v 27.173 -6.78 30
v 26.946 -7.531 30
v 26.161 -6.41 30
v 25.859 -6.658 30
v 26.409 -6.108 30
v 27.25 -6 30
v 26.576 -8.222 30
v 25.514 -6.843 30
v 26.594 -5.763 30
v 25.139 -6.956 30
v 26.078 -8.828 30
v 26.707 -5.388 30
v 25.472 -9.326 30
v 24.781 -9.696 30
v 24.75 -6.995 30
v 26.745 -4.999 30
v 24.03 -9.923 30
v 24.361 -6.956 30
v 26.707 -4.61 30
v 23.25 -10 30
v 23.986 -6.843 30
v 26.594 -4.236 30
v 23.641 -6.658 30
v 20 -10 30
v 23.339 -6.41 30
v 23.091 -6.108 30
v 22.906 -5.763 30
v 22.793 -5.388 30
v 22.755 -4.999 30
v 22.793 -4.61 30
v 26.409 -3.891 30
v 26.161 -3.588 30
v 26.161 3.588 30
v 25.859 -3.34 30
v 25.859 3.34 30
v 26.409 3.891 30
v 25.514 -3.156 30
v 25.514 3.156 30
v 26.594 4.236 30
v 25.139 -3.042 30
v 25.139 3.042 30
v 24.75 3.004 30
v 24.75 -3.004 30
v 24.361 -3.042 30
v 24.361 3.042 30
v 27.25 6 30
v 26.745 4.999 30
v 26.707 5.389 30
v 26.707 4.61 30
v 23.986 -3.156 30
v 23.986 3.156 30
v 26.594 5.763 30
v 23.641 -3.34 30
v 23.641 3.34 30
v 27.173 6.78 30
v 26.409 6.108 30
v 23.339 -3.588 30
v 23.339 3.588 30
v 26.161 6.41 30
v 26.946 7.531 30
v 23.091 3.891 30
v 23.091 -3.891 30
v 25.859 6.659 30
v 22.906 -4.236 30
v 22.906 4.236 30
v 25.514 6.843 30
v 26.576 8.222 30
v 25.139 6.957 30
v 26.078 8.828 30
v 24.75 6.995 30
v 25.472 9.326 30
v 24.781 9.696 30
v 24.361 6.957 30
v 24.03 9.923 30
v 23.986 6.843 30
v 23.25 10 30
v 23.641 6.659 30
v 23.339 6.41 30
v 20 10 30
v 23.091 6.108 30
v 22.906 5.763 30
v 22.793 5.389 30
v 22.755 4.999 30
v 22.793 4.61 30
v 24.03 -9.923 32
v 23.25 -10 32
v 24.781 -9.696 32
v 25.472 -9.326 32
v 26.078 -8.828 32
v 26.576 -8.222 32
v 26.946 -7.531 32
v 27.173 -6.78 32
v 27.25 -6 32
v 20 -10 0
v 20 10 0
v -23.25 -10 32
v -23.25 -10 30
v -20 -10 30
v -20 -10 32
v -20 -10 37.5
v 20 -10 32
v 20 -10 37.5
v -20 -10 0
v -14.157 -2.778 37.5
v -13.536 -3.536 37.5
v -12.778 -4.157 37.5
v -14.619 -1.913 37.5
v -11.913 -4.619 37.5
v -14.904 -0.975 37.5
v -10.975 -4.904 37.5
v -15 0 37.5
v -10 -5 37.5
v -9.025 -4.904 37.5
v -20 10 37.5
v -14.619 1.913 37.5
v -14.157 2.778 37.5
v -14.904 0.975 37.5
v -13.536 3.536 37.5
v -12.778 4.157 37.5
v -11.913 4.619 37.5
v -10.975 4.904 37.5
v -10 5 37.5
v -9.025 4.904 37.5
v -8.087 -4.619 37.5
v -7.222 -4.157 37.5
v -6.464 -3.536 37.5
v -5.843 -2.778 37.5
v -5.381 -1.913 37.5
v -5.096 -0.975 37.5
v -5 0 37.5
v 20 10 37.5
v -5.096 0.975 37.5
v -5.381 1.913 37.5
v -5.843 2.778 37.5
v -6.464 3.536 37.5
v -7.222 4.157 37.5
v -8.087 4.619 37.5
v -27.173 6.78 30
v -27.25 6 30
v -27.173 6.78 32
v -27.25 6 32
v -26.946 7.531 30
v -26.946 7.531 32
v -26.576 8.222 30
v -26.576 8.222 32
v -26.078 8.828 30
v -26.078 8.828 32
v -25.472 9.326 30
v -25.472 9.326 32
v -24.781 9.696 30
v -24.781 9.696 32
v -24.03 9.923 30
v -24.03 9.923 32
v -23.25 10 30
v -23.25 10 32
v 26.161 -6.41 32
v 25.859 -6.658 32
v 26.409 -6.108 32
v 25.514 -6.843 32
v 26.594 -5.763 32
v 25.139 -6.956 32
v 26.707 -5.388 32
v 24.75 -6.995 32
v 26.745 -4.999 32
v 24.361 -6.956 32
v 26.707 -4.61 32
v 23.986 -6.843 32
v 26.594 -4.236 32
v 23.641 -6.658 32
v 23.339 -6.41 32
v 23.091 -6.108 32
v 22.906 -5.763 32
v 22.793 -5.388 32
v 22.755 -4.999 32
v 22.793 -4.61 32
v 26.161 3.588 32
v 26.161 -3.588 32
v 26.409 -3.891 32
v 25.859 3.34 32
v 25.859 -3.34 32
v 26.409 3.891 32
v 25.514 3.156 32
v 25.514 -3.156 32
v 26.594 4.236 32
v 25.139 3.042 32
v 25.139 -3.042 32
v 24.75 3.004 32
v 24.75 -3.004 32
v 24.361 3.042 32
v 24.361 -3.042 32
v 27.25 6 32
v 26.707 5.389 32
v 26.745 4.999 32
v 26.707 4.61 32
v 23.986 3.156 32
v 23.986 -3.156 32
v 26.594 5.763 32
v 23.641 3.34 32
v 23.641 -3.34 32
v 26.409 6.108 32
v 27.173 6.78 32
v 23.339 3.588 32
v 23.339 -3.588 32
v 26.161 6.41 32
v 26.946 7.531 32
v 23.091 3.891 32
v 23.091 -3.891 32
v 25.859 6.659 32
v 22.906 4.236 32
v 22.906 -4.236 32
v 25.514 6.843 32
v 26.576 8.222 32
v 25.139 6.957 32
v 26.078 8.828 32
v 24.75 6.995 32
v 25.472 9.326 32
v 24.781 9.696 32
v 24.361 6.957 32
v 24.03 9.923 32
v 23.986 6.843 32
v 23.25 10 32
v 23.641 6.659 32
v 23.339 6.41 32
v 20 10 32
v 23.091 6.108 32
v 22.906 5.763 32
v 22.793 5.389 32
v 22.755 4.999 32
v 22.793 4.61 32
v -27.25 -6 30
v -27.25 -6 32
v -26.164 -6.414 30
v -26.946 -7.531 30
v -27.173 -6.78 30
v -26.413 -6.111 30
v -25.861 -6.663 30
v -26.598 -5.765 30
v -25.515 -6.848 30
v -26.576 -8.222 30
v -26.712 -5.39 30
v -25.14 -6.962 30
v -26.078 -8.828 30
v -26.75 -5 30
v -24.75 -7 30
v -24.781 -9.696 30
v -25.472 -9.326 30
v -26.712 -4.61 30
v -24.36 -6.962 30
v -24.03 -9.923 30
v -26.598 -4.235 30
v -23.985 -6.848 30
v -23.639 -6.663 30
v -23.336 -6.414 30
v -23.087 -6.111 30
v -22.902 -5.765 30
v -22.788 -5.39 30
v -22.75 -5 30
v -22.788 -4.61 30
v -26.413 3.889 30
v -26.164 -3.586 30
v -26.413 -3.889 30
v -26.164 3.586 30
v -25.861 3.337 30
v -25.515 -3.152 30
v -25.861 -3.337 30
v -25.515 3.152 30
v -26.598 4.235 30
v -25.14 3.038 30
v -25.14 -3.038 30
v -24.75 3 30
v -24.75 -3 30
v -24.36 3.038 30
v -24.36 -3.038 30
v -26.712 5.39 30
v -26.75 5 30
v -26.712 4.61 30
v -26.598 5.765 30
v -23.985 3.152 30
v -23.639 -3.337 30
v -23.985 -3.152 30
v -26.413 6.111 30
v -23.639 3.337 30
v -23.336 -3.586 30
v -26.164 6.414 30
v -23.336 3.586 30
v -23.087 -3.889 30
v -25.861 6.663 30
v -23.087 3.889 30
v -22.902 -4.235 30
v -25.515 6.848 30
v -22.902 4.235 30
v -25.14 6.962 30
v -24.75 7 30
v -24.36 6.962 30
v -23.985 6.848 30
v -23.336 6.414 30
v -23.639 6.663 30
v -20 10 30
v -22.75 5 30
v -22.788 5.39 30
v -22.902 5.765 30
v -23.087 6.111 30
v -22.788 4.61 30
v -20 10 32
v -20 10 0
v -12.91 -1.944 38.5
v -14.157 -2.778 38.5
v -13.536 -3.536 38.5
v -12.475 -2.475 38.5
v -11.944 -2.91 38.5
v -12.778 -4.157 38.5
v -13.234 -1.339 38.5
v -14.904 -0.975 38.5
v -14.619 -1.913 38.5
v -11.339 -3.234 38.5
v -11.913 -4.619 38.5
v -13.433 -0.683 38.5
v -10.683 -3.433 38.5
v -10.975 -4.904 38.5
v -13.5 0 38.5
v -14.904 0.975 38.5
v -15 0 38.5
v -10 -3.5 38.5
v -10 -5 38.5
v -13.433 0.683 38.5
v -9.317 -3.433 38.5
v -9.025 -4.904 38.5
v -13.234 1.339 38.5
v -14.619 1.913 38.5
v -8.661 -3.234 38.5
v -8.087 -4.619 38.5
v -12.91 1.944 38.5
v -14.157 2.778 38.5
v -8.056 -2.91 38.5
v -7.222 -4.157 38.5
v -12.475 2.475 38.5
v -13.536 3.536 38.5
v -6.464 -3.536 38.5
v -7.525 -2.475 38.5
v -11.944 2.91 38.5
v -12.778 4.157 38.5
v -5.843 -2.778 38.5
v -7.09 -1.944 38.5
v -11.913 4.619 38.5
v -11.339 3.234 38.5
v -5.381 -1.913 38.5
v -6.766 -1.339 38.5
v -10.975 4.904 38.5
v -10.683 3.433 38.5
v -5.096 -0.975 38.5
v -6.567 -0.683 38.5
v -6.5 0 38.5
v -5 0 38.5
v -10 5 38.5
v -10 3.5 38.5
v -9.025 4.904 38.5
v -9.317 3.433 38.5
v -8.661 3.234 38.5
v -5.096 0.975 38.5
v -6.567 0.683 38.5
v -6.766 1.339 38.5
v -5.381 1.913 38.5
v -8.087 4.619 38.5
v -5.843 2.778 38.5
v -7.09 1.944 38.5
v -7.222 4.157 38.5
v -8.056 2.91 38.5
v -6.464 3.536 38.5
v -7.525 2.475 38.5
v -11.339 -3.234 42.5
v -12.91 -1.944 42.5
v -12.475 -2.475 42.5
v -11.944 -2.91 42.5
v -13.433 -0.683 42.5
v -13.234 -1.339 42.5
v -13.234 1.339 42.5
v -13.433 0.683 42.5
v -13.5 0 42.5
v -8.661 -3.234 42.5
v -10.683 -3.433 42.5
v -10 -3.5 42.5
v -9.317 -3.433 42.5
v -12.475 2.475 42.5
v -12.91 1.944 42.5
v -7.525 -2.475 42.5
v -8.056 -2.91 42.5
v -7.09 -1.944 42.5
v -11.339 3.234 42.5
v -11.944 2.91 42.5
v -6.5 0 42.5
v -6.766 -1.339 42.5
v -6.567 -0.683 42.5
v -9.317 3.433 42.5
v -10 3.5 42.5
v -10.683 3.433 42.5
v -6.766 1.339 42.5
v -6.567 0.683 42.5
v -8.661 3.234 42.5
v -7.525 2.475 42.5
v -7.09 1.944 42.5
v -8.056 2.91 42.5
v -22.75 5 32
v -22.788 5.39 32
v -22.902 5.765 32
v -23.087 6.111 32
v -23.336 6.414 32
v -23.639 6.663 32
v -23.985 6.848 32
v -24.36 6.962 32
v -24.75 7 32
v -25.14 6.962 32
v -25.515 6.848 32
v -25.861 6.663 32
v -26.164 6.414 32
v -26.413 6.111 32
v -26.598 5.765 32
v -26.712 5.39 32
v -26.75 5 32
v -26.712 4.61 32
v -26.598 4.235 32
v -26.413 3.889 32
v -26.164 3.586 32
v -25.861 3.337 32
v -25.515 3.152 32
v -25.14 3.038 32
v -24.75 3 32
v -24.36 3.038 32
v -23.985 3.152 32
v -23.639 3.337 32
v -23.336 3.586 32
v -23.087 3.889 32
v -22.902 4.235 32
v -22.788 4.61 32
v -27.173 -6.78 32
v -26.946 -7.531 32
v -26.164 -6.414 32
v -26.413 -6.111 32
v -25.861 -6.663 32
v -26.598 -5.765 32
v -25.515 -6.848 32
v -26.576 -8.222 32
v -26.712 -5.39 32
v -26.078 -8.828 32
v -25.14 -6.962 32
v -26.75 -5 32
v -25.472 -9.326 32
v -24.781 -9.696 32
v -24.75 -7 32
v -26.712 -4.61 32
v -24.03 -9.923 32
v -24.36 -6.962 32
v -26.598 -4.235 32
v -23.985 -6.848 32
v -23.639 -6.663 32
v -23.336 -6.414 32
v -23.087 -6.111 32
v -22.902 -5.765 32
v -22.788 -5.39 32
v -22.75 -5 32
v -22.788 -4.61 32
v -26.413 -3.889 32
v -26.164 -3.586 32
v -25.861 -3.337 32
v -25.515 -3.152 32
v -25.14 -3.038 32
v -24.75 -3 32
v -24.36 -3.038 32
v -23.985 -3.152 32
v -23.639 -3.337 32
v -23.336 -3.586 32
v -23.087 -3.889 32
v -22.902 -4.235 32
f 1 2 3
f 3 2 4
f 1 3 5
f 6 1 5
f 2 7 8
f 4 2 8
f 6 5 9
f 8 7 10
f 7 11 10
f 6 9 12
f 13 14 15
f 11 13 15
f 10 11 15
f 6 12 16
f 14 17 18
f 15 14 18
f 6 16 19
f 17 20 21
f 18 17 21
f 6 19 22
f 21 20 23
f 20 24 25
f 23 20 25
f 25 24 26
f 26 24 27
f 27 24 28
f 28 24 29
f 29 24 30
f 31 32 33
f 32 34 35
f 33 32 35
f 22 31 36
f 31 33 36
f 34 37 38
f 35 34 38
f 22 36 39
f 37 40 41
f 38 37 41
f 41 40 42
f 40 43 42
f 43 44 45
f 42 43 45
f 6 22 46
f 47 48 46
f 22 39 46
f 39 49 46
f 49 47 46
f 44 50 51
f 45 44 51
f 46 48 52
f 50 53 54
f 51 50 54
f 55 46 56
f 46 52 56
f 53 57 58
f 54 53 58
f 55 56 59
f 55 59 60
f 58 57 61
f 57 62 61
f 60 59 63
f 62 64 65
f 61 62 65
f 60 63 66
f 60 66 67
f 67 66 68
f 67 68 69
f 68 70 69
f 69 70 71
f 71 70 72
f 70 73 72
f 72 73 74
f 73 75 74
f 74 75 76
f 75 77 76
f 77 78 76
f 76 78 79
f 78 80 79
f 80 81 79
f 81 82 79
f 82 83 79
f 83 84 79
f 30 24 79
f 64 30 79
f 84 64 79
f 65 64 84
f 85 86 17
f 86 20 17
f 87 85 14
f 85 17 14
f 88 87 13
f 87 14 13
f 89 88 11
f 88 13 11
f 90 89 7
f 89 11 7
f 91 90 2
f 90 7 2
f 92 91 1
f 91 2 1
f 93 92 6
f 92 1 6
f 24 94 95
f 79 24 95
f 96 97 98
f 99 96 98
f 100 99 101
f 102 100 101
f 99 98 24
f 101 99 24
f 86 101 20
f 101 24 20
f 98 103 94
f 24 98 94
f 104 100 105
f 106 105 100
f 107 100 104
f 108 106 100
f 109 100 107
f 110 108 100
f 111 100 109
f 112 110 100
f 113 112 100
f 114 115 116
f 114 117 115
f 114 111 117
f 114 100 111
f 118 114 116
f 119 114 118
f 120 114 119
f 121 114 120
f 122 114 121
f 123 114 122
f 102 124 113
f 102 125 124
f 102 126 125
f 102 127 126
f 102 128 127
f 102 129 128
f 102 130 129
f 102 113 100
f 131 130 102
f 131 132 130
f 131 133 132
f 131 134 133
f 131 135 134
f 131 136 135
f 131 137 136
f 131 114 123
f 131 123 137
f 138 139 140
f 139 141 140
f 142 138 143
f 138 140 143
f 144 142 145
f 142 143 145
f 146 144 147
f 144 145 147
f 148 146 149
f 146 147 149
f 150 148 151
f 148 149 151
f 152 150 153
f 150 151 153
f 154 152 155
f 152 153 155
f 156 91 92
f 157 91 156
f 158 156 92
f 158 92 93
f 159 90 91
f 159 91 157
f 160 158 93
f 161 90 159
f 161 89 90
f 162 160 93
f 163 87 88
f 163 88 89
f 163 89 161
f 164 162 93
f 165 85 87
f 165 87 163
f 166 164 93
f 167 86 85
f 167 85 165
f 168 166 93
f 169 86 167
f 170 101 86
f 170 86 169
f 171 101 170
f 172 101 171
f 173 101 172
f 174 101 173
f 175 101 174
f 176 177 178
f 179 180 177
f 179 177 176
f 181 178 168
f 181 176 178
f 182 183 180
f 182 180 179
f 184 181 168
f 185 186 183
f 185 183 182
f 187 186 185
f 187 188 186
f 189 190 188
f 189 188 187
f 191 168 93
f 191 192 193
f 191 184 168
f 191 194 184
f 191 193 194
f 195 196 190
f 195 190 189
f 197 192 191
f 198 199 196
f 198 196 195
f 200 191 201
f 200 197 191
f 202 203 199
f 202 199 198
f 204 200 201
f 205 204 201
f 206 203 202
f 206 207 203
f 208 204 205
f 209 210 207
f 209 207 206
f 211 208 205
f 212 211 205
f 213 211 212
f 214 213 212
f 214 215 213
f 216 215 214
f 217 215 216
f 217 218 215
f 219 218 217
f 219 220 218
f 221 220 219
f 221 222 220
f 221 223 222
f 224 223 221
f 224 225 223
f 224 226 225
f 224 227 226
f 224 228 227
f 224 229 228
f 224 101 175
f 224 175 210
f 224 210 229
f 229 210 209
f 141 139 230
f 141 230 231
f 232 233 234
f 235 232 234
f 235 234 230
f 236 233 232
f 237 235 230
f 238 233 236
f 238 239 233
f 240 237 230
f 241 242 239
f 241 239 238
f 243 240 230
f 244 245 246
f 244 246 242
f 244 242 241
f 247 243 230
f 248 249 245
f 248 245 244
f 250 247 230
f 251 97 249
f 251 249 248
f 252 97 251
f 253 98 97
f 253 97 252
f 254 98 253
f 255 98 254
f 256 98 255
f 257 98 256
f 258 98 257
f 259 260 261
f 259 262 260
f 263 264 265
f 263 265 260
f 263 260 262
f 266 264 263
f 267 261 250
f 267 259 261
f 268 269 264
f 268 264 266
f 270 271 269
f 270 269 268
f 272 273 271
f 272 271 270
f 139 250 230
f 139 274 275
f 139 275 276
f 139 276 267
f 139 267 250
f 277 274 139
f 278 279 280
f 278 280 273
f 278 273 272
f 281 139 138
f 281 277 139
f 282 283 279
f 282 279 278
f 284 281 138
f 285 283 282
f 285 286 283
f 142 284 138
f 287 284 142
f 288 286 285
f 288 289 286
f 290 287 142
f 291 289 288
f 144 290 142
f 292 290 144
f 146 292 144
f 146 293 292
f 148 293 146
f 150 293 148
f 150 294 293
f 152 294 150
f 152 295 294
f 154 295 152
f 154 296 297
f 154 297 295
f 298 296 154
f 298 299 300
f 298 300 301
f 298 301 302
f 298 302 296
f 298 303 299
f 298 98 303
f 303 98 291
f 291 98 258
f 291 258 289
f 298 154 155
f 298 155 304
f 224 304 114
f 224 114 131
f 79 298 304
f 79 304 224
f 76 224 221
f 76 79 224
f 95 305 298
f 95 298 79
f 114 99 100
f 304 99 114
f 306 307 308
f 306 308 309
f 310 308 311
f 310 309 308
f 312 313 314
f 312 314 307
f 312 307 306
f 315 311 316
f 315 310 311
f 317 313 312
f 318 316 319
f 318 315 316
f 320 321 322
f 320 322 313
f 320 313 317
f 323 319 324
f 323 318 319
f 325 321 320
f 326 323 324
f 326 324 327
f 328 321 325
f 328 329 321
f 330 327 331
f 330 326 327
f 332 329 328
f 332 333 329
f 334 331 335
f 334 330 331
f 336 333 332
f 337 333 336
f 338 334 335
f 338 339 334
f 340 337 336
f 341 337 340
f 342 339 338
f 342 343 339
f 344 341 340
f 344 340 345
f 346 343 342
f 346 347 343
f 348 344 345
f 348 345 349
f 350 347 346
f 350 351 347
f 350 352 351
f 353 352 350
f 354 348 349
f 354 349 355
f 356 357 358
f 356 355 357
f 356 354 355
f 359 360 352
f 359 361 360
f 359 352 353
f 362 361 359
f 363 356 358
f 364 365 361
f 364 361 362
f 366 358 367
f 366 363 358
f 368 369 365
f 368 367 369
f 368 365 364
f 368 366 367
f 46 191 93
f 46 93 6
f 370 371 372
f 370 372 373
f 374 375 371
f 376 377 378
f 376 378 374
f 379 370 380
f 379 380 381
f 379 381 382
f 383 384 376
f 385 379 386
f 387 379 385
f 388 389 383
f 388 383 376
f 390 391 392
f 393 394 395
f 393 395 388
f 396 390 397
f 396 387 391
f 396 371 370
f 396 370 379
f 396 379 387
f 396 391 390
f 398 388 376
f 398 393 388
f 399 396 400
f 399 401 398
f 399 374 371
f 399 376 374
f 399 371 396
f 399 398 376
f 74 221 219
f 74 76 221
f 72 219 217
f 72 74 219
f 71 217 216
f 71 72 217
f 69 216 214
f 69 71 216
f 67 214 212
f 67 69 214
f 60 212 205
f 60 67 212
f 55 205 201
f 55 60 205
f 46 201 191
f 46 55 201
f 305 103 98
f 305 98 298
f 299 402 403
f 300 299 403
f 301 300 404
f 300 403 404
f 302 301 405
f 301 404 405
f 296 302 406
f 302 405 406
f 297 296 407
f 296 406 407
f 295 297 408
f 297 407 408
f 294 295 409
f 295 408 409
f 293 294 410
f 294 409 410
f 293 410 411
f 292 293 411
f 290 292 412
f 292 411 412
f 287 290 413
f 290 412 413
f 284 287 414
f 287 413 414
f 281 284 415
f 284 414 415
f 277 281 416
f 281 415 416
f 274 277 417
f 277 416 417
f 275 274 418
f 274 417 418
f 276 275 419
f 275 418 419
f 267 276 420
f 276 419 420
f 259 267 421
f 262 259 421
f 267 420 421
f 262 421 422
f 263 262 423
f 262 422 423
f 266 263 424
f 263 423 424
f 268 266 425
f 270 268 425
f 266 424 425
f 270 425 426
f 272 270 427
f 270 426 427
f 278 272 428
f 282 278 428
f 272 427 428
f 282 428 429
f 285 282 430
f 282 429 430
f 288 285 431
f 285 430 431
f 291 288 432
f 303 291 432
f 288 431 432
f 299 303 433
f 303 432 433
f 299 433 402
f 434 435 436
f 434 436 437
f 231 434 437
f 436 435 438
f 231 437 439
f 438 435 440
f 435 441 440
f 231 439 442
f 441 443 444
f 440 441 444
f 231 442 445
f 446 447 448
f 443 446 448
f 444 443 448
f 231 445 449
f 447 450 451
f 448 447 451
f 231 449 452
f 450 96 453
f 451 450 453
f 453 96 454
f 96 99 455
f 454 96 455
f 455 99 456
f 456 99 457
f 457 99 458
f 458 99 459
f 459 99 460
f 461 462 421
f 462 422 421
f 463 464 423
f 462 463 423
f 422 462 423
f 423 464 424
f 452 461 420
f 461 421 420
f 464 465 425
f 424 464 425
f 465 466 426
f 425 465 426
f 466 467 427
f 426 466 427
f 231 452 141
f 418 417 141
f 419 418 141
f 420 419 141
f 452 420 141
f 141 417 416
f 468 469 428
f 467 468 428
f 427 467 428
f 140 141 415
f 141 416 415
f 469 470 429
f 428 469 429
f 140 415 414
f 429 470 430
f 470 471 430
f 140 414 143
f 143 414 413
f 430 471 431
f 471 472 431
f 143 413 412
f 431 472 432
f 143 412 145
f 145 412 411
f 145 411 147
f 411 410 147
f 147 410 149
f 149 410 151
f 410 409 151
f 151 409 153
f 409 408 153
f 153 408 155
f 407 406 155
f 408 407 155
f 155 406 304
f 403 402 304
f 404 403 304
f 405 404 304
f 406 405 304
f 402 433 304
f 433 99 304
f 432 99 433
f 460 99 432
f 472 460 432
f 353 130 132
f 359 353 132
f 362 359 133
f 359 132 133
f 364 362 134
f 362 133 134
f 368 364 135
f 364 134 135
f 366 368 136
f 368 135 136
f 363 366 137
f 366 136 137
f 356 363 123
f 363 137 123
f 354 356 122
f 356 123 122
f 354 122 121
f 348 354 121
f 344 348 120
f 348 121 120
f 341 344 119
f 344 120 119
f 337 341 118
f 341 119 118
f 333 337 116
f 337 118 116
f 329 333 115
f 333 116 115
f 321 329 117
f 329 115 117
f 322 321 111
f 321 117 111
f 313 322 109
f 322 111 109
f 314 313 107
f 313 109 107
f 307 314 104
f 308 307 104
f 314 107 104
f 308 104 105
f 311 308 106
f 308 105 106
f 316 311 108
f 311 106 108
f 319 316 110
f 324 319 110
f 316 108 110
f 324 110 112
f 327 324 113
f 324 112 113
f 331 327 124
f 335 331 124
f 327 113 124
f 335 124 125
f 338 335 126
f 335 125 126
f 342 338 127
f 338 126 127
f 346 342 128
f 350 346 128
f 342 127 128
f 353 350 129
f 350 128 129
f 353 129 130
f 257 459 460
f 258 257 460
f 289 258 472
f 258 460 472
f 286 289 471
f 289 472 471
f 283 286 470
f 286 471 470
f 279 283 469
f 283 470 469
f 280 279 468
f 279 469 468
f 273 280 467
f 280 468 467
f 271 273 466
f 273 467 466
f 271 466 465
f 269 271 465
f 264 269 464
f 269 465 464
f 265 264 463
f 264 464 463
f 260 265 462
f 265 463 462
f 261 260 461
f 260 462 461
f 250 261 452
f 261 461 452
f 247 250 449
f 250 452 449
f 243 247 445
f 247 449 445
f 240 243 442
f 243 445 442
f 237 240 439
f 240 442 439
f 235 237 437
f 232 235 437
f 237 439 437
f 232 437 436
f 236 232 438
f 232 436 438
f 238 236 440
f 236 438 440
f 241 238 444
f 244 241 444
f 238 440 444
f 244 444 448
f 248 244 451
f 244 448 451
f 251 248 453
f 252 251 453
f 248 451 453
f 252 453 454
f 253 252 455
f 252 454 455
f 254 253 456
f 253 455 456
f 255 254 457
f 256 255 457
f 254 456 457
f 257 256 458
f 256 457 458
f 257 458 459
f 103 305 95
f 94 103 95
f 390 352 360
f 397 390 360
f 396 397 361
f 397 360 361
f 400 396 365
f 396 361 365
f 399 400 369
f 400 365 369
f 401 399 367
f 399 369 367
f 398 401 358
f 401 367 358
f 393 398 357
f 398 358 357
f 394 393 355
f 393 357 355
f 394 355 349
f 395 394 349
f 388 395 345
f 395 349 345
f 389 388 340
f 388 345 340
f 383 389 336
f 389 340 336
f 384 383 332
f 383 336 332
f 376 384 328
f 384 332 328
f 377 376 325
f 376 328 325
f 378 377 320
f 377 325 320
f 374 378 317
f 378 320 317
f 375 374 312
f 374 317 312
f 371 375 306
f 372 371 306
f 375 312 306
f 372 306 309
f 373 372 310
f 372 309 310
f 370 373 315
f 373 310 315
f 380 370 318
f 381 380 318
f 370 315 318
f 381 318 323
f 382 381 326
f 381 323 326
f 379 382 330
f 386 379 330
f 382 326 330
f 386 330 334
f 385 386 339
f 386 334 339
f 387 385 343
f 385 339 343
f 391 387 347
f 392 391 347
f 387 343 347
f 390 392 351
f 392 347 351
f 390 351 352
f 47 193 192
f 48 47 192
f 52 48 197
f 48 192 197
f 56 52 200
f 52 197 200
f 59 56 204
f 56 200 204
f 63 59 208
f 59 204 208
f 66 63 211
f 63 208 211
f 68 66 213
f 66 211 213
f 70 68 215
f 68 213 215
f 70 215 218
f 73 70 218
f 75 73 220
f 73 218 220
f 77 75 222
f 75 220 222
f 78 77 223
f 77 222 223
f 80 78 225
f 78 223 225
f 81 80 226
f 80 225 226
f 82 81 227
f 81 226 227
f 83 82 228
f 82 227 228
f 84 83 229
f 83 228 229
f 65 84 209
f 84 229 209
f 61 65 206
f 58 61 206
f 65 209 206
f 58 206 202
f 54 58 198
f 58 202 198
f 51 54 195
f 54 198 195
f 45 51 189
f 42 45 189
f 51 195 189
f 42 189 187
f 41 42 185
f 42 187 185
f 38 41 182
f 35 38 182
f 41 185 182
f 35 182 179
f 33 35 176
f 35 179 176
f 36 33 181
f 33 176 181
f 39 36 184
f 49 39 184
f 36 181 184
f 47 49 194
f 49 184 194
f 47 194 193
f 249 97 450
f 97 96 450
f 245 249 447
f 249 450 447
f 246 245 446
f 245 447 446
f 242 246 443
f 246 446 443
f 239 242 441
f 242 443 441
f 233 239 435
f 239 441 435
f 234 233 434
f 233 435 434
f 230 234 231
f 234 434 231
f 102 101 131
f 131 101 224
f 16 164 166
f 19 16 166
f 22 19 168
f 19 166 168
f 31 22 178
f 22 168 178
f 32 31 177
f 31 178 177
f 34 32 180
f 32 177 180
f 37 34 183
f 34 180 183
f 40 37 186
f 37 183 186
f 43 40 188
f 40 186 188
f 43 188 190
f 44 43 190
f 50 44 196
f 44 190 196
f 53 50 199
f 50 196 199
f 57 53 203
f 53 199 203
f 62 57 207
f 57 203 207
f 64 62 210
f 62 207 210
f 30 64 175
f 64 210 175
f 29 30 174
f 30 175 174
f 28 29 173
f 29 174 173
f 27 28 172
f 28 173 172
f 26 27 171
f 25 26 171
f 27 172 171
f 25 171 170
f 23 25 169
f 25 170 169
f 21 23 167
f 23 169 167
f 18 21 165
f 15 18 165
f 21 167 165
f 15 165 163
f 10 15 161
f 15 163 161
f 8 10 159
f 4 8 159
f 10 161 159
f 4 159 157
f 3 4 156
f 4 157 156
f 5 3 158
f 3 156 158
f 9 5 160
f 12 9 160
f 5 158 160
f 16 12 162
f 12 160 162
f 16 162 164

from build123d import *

# Parameters (mm, degrees)
SKETCH1_W           = 40
SKETCH1_H           = 20
BOSS_EXTRUDE2_DEPTH = 37.5
SKETCH2_W           = 2
SKETCH2_H           = 20
BOSS_EXTRUDE3_DEPTH = 7.25
SKETCH3_R           = 1.995473195
CUT_EXTRUDE1_DEPTH  = 2
FILLET3_R           = 4
SKETCH4_W           = 2
SKETCH4_H           = 20
BOSS_EXTRUDE4_DEPTH = 7.25
SKETCH5_R           = 2
CUT_EXTRUDE2_DEPTH  = 2
FILLET4_R           = 4
SKETCH6_R           = 5
BOSS_EXTRUDE5_DEPTH = 1
SKETCH7_R           = 3.5
BOSS_EXTRUDE7_DEPTH = 4


with BuildPart() as part:
    # Sketch1 → Boss-Extrude2 (new body)
    with BuildSketch(Plane.XY):
        Rectangle(SKETCH1_W, SKETCH1_H)
    extrude(amount=BOSS_EXTRUDE2_DEPTH)

    # Sketch2 → Boss-Extrude3 (add)
    with BuildSketch(Plane(origin=(20, 0, 0), x_dir=(0, 0, -1), z_dir=(1, 0, 0))):
        with Locations((-31, 0)):
            Rectangle(SKETCH2_W, SKETCH2_H)
    extrude(amount=BOSS_EXTRUDE3_DEPTH)

    # Sketch3 → Cut-Extrude1 (cut)
    with BuildSketch(Plane.XY.offset(32)):
        with Locations((24.75, -4.99913934)):
            Circle(SKETCH3_R)
        with Locations((24.75, 4.999429987)):
            Circle(SKETCH3_R)
    extrude(amount=-CUT_EXTRUDE1_DEPTH, mode=Mode.SUBTRACT)

    # Fillet3
    fillet3_edges = [part.edges().sort_by_distance(p)[0] for p in [
        (27.25, -10, 31),
        (27.25, 10, 31),
    ]]
    fillet(fillet3_edges, radius=FILLET3_R)

    # Sketch4 → Boss-Extrude4 (add)
    with BuildSketch(Plane.ZY.offset(20)):
        with Locations((31, 0)):
            Rectangle(SKETCH4_W, SKETCH4_H)
    extrude(amount=BOSS_EXTRUDE4_DEPTH)

    # Sketch5 → Cut-Extrude2 (cut)
    with BuildSketch(Plane.XY.offset(32)):
        with Locations((-24.75, 5)):
            Circle(SKETCH5_R)
        with Locations((-24.75, -5)):
            Circle(SKETCH5_R)
    extrude(amount=-CUT_EXTRUDE2_DEPTH, mode=Mode.SUBTRACT)

    # Fillet4
    fillet4_edges = [part.edges().sort_by_distance(p)[0] for p in [
        (-27.25, -10, 31),
        (-27.25, 10, 31),
    ]]
    fillet(fillet4_edges, radius=FILLET4_R)

    # Sketch6 → Boss-Extrude5 (add)
    with BuildSketch(Plane.XY.offset(37.5)):
        with Locations((-10, 0)):
            Circle(SKETCH6_R)
    extrude(amount=BOSS_EXTRUDE5_DEPTH)

    # Sketch7 → Boss-Extrude7 (add)
    with BuildSketch(Plane.XY.offset(38.5)):
        with Locations((-10, 0)):
            Circle(SKETCH7_R)
    extrude(amount=BOSS_EXTRUDE7_DEPTH)


solid = part.part
